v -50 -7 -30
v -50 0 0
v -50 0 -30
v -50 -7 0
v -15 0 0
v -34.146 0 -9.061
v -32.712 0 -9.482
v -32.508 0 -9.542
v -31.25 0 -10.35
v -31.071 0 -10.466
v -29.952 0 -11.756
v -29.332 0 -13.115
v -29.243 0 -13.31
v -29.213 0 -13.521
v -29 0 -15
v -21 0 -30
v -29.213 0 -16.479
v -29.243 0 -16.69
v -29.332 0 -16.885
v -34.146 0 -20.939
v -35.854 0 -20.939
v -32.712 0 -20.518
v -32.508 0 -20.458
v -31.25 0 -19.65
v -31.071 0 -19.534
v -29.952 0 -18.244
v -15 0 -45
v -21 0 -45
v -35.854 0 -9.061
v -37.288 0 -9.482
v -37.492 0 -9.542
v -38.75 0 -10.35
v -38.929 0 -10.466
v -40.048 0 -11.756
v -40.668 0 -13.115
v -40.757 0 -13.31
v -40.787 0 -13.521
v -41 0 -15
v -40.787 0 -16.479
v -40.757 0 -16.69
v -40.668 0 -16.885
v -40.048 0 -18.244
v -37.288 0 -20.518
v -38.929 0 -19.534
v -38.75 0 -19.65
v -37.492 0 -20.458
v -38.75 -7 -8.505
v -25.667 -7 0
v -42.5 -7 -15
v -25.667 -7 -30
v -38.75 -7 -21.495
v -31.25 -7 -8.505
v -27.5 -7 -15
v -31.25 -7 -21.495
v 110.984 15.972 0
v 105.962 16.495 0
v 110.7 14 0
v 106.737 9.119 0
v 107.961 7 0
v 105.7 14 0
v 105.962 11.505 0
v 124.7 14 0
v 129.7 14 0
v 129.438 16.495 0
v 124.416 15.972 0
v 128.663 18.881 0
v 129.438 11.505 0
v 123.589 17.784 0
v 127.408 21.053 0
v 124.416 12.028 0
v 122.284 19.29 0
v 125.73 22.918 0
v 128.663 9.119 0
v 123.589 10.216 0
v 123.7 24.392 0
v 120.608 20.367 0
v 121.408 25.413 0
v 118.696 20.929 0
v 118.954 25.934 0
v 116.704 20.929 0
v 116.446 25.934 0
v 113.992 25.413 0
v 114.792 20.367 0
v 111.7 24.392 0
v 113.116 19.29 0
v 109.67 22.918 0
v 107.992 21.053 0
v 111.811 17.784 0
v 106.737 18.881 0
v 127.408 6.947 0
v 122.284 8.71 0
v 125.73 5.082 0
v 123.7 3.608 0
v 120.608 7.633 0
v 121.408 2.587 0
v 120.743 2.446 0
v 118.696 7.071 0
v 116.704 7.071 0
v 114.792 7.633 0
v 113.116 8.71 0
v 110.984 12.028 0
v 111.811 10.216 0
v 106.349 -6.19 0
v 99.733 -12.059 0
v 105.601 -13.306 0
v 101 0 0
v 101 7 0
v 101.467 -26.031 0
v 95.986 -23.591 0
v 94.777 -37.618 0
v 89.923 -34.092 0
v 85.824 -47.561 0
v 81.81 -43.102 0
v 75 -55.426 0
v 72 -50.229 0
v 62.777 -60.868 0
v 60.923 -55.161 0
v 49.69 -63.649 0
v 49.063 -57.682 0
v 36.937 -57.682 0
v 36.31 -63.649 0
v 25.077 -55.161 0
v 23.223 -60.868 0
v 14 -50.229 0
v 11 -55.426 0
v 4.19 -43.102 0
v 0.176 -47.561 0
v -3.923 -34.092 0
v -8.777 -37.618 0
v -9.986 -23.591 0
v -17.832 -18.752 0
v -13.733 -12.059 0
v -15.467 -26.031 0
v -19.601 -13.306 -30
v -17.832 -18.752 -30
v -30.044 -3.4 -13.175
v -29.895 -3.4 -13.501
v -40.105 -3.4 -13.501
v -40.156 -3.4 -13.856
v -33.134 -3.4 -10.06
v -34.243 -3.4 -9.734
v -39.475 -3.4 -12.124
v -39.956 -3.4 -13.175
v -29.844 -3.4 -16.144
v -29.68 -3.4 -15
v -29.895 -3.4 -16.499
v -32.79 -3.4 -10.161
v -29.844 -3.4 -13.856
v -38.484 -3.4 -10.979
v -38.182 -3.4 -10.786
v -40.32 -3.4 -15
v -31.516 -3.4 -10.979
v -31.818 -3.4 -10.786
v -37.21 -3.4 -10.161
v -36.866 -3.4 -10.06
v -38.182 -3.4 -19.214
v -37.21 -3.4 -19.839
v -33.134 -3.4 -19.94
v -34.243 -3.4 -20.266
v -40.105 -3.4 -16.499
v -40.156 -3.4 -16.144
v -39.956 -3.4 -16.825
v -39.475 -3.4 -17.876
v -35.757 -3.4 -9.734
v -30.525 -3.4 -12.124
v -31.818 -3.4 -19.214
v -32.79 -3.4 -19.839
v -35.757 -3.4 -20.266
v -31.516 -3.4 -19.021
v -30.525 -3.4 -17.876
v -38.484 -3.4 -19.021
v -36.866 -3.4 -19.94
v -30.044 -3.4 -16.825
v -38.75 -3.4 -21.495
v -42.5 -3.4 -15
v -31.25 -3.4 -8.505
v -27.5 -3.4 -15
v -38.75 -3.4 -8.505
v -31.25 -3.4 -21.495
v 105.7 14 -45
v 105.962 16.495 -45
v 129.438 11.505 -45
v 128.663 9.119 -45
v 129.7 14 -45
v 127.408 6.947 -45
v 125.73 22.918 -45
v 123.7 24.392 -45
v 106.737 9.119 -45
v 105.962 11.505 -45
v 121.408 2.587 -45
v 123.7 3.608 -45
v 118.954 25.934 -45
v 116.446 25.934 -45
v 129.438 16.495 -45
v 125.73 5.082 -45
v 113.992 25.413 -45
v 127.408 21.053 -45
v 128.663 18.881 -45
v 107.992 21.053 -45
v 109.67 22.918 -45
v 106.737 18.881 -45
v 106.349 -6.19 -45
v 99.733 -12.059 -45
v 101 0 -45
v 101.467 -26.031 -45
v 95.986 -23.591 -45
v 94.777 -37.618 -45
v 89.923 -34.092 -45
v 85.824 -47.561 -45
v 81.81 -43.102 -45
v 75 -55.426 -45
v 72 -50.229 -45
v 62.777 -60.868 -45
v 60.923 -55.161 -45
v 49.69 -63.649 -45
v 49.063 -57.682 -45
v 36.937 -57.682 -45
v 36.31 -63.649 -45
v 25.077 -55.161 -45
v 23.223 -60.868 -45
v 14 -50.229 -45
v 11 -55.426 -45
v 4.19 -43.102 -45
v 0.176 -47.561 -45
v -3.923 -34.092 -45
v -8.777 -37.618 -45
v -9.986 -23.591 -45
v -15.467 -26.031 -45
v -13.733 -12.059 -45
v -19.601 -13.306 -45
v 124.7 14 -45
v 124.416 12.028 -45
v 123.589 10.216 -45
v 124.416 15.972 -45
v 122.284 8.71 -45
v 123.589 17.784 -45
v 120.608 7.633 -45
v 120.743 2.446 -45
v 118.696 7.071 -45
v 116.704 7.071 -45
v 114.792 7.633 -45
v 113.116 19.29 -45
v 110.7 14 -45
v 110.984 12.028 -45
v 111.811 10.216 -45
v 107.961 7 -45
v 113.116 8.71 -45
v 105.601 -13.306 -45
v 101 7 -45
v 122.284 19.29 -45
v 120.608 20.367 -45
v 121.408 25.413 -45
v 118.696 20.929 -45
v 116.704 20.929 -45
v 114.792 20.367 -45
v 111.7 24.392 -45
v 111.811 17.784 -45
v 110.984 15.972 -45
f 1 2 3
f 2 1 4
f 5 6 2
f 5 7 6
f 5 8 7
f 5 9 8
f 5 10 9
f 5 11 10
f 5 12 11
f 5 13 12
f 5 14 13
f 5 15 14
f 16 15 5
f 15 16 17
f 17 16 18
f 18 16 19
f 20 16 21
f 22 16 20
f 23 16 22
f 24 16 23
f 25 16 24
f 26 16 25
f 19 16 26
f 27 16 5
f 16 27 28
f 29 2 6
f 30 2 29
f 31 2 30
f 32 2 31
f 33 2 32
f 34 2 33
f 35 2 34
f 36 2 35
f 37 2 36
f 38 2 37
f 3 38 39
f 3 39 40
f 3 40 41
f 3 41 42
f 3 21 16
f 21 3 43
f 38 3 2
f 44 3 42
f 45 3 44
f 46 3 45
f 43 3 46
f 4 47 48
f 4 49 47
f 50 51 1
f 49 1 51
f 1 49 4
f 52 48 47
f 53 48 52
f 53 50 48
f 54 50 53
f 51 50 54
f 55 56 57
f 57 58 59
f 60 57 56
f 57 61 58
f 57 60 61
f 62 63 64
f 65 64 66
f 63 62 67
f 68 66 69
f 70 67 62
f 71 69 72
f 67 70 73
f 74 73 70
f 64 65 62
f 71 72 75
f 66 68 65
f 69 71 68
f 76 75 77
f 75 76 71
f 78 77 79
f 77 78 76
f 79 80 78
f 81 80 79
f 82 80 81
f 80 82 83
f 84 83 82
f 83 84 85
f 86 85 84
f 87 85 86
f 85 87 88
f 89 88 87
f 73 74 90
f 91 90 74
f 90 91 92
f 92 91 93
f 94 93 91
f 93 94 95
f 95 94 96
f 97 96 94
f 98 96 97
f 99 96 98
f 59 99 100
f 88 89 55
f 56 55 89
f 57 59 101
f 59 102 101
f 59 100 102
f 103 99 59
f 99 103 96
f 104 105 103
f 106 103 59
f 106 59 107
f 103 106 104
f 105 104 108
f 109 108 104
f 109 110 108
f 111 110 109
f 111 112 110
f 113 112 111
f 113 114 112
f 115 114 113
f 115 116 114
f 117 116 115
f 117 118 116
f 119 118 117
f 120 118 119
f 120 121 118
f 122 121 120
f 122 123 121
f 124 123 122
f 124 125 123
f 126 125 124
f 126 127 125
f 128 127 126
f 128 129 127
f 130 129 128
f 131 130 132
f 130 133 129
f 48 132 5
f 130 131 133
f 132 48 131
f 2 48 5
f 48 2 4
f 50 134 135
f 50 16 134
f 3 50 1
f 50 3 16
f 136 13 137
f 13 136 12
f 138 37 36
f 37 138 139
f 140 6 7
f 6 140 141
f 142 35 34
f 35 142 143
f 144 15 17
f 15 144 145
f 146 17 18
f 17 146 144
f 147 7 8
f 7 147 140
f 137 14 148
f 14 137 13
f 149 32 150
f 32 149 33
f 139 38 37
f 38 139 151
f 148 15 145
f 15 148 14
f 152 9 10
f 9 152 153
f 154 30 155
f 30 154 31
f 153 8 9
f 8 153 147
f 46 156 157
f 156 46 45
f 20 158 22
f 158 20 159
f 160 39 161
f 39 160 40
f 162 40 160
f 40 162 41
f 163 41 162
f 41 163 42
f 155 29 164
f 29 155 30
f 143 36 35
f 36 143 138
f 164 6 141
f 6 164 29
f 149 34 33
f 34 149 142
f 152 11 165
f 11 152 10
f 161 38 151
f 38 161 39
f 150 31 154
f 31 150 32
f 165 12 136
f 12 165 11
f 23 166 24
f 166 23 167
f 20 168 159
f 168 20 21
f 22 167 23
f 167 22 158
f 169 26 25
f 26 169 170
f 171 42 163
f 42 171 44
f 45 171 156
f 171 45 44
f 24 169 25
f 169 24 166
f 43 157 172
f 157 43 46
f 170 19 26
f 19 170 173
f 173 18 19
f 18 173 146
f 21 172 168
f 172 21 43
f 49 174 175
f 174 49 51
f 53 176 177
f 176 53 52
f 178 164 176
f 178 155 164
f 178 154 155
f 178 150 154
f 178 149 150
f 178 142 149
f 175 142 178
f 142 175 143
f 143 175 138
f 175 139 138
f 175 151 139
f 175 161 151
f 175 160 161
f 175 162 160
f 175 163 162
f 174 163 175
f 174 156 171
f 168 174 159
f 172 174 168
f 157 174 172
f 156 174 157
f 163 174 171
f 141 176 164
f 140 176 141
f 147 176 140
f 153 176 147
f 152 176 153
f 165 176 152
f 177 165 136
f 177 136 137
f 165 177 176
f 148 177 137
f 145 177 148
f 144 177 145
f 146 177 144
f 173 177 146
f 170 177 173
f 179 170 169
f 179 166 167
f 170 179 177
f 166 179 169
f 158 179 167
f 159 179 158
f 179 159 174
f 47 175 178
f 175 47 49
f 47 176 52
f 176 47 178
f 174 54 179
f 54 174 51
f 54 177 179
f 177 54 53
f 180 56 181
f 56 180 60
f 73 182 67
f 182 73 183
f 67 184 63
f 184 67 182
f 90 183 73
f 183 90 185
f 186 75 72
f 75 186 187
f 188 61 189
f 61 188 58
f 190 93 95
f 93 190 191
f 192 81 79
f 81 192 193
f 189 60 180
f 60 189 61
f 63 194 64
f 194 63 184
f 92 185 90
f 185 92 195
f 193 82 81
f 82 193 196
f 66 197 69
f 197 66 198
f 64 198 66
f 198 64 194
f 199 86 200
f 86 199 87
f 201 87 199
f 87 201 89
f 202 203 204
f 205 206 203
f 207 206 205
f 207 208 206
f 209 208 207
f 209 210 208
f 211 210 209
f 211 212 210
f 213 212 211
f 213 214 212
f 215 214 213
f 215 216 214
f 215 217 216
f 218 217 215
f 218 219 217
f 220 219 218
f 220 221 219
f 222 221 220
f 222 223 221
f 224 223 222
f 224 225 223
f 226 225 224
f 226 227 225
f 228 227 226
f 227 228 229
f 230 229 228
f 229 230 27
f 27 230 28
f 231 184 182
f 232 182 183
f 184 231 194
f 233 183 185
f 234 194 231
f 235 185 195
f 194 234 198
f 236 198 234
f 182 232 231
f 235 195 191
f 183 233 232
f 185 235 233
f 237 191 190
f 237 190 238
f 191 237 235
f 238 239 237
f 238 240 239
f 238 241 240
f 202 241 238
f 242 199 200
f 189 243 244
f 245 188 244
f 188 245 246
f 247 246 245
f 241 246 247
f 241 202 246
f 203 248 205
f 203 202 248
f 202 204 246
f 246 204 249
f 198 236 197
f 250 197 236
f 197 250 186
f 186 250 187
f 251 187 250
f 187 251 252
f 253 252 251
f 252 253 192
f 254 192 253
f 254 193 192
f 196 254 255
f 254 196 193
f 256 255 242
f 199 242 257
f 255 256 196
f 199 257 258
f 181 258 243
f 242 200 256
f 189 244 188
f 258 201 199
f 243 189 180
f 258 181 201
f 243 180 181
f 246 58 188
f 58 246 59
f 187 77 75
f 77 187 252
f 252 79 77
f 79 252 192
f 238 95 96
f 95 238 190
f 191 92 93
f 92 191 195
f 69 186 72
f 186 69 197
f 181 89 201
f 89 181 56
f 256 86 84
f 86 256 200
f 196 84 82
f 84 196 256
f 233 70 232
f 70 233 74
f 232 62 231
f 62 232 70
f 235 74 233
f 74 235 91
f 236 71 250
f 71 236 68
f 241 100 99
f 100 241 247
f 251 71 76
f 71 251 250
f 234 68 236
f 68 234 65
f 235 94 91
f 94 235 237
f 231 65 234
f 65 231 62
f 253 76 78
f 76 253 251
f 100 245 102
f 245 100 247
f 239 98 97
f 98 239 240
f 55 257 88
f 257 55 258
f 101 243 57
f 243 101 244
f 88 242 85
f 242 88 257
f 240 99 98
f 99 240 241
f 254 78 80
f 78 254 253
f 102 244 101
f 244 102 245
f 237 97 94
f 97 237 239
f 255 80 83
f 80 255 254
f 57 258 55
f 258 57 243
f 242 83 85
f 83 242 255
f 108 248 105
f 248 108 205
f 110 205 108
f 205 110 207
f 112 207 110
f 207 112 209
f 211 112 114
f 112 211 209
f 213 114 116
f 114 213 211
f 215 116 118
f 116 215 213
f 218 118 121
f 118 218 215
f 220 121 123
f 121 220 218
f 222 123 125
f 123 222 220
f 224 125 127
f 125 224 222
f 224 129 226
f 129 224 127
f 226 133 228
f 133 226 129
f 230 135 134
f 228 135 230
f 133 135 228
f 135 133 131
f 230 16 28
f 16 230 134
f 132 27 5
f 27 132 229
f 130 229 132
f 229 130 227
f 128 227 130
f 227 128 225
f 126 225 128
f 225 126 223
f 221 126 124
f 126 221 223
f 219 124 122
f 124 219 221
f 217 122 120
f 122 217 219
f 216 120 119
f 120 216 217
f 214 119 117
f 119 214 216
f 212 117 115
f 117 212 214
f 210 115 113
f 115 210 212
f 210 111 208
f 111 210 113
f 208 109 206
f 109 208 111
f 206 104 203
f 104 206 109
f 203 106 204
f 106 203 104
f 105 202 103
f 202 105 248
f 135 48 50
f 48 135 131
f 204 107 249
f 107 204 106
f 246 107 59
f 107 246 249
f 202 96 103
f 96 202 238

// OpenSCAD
use <MCAD/2Dshapes.scad>;
include <MCAD/3d_triangle.scad>;
use <MCAD/regular_shapes.scad>;     

module prism(l, w, h)
{
    polyhedron(points=[[0,0,0], [0,w,h], [l,w,h], [l,0,0], [0,w,0], [l,w,0]],
               // top sloping face (A)
               faces=[[0,1,2,3],
               // vertical rectangular face (B)
               [2,1,4,5],
               // bottom face (C)
               [0,3,5,4],
               // rear triangular face (D)
               [0,4,1],
               // front triangular face (E)
               [3,2,5]]
               );
}

//clamp body
rotate ([180,0]) 
{
    translate([43,0]) linear_extrude(45) donutSlice(innerSize=58, outerSize=64, start_angle=0, end_angle=180);

    //clamp body w double flange
    //translate([43,0]) linear_extrude(30) donutSlice(innerSize=58, outerSize=64, start_angle=0, end_angle=180);

    //right flange - front       
    difference()
    {
        difference() 
        {
            translate([-50,7, 0])rotate ([90,0]) cube([30,30,7]);
            translate ([-35,15, 15])rotate ([90,0]) cylinder(20, 3,7);
        }
        translate ([-35,11.4, 15])rotate ([90,0]) linear_extrude(height = 8) 
        {
           hexagon(7.5);
        }   
    }
    translate ([-27,5,0]) rotate ([270,270,0]) prism (30,10,15); 
   
    
    //right flange - back
/*    difference()
    {
        difference() 
        {
            translate([-50,7, 15])rotate ([90,0]) cube([30,30,7]);
            translate ([-35,15, 30])rotate ([90,0]) cylinder(20, 3,7);
        }
        translate ([-35,11.4, 30])rotate ([90,0]) linear_extrude(height = 8) 
        {
           hexagon(7.5);
        }        
    }
    translate ([-27,5,15]) rotate ([270,270,0]) prism (30,10,15);
*/    
   
    //left flange - remove for hinged version
    /*difference () 
    {
        translate([106,7])rotate ([90,0]) cube([30,30,7]);
        translate ([120,15, 15])rotate ([90,0]) cylinder(20, 3,7);
    }*/

    //hinge hole
    translate ([101,0]) rotate ([90,0]) cube([15,45,7],0);
    difference() {translate ([117.7,-14,0]) cylinder(45, 12,12); translate ([117.7,-14,-10]) cylinder(200, 7,7);}
    translate ([125,-5,45]) rotate ([0,90, 90]) prism (45,20,12);
}
